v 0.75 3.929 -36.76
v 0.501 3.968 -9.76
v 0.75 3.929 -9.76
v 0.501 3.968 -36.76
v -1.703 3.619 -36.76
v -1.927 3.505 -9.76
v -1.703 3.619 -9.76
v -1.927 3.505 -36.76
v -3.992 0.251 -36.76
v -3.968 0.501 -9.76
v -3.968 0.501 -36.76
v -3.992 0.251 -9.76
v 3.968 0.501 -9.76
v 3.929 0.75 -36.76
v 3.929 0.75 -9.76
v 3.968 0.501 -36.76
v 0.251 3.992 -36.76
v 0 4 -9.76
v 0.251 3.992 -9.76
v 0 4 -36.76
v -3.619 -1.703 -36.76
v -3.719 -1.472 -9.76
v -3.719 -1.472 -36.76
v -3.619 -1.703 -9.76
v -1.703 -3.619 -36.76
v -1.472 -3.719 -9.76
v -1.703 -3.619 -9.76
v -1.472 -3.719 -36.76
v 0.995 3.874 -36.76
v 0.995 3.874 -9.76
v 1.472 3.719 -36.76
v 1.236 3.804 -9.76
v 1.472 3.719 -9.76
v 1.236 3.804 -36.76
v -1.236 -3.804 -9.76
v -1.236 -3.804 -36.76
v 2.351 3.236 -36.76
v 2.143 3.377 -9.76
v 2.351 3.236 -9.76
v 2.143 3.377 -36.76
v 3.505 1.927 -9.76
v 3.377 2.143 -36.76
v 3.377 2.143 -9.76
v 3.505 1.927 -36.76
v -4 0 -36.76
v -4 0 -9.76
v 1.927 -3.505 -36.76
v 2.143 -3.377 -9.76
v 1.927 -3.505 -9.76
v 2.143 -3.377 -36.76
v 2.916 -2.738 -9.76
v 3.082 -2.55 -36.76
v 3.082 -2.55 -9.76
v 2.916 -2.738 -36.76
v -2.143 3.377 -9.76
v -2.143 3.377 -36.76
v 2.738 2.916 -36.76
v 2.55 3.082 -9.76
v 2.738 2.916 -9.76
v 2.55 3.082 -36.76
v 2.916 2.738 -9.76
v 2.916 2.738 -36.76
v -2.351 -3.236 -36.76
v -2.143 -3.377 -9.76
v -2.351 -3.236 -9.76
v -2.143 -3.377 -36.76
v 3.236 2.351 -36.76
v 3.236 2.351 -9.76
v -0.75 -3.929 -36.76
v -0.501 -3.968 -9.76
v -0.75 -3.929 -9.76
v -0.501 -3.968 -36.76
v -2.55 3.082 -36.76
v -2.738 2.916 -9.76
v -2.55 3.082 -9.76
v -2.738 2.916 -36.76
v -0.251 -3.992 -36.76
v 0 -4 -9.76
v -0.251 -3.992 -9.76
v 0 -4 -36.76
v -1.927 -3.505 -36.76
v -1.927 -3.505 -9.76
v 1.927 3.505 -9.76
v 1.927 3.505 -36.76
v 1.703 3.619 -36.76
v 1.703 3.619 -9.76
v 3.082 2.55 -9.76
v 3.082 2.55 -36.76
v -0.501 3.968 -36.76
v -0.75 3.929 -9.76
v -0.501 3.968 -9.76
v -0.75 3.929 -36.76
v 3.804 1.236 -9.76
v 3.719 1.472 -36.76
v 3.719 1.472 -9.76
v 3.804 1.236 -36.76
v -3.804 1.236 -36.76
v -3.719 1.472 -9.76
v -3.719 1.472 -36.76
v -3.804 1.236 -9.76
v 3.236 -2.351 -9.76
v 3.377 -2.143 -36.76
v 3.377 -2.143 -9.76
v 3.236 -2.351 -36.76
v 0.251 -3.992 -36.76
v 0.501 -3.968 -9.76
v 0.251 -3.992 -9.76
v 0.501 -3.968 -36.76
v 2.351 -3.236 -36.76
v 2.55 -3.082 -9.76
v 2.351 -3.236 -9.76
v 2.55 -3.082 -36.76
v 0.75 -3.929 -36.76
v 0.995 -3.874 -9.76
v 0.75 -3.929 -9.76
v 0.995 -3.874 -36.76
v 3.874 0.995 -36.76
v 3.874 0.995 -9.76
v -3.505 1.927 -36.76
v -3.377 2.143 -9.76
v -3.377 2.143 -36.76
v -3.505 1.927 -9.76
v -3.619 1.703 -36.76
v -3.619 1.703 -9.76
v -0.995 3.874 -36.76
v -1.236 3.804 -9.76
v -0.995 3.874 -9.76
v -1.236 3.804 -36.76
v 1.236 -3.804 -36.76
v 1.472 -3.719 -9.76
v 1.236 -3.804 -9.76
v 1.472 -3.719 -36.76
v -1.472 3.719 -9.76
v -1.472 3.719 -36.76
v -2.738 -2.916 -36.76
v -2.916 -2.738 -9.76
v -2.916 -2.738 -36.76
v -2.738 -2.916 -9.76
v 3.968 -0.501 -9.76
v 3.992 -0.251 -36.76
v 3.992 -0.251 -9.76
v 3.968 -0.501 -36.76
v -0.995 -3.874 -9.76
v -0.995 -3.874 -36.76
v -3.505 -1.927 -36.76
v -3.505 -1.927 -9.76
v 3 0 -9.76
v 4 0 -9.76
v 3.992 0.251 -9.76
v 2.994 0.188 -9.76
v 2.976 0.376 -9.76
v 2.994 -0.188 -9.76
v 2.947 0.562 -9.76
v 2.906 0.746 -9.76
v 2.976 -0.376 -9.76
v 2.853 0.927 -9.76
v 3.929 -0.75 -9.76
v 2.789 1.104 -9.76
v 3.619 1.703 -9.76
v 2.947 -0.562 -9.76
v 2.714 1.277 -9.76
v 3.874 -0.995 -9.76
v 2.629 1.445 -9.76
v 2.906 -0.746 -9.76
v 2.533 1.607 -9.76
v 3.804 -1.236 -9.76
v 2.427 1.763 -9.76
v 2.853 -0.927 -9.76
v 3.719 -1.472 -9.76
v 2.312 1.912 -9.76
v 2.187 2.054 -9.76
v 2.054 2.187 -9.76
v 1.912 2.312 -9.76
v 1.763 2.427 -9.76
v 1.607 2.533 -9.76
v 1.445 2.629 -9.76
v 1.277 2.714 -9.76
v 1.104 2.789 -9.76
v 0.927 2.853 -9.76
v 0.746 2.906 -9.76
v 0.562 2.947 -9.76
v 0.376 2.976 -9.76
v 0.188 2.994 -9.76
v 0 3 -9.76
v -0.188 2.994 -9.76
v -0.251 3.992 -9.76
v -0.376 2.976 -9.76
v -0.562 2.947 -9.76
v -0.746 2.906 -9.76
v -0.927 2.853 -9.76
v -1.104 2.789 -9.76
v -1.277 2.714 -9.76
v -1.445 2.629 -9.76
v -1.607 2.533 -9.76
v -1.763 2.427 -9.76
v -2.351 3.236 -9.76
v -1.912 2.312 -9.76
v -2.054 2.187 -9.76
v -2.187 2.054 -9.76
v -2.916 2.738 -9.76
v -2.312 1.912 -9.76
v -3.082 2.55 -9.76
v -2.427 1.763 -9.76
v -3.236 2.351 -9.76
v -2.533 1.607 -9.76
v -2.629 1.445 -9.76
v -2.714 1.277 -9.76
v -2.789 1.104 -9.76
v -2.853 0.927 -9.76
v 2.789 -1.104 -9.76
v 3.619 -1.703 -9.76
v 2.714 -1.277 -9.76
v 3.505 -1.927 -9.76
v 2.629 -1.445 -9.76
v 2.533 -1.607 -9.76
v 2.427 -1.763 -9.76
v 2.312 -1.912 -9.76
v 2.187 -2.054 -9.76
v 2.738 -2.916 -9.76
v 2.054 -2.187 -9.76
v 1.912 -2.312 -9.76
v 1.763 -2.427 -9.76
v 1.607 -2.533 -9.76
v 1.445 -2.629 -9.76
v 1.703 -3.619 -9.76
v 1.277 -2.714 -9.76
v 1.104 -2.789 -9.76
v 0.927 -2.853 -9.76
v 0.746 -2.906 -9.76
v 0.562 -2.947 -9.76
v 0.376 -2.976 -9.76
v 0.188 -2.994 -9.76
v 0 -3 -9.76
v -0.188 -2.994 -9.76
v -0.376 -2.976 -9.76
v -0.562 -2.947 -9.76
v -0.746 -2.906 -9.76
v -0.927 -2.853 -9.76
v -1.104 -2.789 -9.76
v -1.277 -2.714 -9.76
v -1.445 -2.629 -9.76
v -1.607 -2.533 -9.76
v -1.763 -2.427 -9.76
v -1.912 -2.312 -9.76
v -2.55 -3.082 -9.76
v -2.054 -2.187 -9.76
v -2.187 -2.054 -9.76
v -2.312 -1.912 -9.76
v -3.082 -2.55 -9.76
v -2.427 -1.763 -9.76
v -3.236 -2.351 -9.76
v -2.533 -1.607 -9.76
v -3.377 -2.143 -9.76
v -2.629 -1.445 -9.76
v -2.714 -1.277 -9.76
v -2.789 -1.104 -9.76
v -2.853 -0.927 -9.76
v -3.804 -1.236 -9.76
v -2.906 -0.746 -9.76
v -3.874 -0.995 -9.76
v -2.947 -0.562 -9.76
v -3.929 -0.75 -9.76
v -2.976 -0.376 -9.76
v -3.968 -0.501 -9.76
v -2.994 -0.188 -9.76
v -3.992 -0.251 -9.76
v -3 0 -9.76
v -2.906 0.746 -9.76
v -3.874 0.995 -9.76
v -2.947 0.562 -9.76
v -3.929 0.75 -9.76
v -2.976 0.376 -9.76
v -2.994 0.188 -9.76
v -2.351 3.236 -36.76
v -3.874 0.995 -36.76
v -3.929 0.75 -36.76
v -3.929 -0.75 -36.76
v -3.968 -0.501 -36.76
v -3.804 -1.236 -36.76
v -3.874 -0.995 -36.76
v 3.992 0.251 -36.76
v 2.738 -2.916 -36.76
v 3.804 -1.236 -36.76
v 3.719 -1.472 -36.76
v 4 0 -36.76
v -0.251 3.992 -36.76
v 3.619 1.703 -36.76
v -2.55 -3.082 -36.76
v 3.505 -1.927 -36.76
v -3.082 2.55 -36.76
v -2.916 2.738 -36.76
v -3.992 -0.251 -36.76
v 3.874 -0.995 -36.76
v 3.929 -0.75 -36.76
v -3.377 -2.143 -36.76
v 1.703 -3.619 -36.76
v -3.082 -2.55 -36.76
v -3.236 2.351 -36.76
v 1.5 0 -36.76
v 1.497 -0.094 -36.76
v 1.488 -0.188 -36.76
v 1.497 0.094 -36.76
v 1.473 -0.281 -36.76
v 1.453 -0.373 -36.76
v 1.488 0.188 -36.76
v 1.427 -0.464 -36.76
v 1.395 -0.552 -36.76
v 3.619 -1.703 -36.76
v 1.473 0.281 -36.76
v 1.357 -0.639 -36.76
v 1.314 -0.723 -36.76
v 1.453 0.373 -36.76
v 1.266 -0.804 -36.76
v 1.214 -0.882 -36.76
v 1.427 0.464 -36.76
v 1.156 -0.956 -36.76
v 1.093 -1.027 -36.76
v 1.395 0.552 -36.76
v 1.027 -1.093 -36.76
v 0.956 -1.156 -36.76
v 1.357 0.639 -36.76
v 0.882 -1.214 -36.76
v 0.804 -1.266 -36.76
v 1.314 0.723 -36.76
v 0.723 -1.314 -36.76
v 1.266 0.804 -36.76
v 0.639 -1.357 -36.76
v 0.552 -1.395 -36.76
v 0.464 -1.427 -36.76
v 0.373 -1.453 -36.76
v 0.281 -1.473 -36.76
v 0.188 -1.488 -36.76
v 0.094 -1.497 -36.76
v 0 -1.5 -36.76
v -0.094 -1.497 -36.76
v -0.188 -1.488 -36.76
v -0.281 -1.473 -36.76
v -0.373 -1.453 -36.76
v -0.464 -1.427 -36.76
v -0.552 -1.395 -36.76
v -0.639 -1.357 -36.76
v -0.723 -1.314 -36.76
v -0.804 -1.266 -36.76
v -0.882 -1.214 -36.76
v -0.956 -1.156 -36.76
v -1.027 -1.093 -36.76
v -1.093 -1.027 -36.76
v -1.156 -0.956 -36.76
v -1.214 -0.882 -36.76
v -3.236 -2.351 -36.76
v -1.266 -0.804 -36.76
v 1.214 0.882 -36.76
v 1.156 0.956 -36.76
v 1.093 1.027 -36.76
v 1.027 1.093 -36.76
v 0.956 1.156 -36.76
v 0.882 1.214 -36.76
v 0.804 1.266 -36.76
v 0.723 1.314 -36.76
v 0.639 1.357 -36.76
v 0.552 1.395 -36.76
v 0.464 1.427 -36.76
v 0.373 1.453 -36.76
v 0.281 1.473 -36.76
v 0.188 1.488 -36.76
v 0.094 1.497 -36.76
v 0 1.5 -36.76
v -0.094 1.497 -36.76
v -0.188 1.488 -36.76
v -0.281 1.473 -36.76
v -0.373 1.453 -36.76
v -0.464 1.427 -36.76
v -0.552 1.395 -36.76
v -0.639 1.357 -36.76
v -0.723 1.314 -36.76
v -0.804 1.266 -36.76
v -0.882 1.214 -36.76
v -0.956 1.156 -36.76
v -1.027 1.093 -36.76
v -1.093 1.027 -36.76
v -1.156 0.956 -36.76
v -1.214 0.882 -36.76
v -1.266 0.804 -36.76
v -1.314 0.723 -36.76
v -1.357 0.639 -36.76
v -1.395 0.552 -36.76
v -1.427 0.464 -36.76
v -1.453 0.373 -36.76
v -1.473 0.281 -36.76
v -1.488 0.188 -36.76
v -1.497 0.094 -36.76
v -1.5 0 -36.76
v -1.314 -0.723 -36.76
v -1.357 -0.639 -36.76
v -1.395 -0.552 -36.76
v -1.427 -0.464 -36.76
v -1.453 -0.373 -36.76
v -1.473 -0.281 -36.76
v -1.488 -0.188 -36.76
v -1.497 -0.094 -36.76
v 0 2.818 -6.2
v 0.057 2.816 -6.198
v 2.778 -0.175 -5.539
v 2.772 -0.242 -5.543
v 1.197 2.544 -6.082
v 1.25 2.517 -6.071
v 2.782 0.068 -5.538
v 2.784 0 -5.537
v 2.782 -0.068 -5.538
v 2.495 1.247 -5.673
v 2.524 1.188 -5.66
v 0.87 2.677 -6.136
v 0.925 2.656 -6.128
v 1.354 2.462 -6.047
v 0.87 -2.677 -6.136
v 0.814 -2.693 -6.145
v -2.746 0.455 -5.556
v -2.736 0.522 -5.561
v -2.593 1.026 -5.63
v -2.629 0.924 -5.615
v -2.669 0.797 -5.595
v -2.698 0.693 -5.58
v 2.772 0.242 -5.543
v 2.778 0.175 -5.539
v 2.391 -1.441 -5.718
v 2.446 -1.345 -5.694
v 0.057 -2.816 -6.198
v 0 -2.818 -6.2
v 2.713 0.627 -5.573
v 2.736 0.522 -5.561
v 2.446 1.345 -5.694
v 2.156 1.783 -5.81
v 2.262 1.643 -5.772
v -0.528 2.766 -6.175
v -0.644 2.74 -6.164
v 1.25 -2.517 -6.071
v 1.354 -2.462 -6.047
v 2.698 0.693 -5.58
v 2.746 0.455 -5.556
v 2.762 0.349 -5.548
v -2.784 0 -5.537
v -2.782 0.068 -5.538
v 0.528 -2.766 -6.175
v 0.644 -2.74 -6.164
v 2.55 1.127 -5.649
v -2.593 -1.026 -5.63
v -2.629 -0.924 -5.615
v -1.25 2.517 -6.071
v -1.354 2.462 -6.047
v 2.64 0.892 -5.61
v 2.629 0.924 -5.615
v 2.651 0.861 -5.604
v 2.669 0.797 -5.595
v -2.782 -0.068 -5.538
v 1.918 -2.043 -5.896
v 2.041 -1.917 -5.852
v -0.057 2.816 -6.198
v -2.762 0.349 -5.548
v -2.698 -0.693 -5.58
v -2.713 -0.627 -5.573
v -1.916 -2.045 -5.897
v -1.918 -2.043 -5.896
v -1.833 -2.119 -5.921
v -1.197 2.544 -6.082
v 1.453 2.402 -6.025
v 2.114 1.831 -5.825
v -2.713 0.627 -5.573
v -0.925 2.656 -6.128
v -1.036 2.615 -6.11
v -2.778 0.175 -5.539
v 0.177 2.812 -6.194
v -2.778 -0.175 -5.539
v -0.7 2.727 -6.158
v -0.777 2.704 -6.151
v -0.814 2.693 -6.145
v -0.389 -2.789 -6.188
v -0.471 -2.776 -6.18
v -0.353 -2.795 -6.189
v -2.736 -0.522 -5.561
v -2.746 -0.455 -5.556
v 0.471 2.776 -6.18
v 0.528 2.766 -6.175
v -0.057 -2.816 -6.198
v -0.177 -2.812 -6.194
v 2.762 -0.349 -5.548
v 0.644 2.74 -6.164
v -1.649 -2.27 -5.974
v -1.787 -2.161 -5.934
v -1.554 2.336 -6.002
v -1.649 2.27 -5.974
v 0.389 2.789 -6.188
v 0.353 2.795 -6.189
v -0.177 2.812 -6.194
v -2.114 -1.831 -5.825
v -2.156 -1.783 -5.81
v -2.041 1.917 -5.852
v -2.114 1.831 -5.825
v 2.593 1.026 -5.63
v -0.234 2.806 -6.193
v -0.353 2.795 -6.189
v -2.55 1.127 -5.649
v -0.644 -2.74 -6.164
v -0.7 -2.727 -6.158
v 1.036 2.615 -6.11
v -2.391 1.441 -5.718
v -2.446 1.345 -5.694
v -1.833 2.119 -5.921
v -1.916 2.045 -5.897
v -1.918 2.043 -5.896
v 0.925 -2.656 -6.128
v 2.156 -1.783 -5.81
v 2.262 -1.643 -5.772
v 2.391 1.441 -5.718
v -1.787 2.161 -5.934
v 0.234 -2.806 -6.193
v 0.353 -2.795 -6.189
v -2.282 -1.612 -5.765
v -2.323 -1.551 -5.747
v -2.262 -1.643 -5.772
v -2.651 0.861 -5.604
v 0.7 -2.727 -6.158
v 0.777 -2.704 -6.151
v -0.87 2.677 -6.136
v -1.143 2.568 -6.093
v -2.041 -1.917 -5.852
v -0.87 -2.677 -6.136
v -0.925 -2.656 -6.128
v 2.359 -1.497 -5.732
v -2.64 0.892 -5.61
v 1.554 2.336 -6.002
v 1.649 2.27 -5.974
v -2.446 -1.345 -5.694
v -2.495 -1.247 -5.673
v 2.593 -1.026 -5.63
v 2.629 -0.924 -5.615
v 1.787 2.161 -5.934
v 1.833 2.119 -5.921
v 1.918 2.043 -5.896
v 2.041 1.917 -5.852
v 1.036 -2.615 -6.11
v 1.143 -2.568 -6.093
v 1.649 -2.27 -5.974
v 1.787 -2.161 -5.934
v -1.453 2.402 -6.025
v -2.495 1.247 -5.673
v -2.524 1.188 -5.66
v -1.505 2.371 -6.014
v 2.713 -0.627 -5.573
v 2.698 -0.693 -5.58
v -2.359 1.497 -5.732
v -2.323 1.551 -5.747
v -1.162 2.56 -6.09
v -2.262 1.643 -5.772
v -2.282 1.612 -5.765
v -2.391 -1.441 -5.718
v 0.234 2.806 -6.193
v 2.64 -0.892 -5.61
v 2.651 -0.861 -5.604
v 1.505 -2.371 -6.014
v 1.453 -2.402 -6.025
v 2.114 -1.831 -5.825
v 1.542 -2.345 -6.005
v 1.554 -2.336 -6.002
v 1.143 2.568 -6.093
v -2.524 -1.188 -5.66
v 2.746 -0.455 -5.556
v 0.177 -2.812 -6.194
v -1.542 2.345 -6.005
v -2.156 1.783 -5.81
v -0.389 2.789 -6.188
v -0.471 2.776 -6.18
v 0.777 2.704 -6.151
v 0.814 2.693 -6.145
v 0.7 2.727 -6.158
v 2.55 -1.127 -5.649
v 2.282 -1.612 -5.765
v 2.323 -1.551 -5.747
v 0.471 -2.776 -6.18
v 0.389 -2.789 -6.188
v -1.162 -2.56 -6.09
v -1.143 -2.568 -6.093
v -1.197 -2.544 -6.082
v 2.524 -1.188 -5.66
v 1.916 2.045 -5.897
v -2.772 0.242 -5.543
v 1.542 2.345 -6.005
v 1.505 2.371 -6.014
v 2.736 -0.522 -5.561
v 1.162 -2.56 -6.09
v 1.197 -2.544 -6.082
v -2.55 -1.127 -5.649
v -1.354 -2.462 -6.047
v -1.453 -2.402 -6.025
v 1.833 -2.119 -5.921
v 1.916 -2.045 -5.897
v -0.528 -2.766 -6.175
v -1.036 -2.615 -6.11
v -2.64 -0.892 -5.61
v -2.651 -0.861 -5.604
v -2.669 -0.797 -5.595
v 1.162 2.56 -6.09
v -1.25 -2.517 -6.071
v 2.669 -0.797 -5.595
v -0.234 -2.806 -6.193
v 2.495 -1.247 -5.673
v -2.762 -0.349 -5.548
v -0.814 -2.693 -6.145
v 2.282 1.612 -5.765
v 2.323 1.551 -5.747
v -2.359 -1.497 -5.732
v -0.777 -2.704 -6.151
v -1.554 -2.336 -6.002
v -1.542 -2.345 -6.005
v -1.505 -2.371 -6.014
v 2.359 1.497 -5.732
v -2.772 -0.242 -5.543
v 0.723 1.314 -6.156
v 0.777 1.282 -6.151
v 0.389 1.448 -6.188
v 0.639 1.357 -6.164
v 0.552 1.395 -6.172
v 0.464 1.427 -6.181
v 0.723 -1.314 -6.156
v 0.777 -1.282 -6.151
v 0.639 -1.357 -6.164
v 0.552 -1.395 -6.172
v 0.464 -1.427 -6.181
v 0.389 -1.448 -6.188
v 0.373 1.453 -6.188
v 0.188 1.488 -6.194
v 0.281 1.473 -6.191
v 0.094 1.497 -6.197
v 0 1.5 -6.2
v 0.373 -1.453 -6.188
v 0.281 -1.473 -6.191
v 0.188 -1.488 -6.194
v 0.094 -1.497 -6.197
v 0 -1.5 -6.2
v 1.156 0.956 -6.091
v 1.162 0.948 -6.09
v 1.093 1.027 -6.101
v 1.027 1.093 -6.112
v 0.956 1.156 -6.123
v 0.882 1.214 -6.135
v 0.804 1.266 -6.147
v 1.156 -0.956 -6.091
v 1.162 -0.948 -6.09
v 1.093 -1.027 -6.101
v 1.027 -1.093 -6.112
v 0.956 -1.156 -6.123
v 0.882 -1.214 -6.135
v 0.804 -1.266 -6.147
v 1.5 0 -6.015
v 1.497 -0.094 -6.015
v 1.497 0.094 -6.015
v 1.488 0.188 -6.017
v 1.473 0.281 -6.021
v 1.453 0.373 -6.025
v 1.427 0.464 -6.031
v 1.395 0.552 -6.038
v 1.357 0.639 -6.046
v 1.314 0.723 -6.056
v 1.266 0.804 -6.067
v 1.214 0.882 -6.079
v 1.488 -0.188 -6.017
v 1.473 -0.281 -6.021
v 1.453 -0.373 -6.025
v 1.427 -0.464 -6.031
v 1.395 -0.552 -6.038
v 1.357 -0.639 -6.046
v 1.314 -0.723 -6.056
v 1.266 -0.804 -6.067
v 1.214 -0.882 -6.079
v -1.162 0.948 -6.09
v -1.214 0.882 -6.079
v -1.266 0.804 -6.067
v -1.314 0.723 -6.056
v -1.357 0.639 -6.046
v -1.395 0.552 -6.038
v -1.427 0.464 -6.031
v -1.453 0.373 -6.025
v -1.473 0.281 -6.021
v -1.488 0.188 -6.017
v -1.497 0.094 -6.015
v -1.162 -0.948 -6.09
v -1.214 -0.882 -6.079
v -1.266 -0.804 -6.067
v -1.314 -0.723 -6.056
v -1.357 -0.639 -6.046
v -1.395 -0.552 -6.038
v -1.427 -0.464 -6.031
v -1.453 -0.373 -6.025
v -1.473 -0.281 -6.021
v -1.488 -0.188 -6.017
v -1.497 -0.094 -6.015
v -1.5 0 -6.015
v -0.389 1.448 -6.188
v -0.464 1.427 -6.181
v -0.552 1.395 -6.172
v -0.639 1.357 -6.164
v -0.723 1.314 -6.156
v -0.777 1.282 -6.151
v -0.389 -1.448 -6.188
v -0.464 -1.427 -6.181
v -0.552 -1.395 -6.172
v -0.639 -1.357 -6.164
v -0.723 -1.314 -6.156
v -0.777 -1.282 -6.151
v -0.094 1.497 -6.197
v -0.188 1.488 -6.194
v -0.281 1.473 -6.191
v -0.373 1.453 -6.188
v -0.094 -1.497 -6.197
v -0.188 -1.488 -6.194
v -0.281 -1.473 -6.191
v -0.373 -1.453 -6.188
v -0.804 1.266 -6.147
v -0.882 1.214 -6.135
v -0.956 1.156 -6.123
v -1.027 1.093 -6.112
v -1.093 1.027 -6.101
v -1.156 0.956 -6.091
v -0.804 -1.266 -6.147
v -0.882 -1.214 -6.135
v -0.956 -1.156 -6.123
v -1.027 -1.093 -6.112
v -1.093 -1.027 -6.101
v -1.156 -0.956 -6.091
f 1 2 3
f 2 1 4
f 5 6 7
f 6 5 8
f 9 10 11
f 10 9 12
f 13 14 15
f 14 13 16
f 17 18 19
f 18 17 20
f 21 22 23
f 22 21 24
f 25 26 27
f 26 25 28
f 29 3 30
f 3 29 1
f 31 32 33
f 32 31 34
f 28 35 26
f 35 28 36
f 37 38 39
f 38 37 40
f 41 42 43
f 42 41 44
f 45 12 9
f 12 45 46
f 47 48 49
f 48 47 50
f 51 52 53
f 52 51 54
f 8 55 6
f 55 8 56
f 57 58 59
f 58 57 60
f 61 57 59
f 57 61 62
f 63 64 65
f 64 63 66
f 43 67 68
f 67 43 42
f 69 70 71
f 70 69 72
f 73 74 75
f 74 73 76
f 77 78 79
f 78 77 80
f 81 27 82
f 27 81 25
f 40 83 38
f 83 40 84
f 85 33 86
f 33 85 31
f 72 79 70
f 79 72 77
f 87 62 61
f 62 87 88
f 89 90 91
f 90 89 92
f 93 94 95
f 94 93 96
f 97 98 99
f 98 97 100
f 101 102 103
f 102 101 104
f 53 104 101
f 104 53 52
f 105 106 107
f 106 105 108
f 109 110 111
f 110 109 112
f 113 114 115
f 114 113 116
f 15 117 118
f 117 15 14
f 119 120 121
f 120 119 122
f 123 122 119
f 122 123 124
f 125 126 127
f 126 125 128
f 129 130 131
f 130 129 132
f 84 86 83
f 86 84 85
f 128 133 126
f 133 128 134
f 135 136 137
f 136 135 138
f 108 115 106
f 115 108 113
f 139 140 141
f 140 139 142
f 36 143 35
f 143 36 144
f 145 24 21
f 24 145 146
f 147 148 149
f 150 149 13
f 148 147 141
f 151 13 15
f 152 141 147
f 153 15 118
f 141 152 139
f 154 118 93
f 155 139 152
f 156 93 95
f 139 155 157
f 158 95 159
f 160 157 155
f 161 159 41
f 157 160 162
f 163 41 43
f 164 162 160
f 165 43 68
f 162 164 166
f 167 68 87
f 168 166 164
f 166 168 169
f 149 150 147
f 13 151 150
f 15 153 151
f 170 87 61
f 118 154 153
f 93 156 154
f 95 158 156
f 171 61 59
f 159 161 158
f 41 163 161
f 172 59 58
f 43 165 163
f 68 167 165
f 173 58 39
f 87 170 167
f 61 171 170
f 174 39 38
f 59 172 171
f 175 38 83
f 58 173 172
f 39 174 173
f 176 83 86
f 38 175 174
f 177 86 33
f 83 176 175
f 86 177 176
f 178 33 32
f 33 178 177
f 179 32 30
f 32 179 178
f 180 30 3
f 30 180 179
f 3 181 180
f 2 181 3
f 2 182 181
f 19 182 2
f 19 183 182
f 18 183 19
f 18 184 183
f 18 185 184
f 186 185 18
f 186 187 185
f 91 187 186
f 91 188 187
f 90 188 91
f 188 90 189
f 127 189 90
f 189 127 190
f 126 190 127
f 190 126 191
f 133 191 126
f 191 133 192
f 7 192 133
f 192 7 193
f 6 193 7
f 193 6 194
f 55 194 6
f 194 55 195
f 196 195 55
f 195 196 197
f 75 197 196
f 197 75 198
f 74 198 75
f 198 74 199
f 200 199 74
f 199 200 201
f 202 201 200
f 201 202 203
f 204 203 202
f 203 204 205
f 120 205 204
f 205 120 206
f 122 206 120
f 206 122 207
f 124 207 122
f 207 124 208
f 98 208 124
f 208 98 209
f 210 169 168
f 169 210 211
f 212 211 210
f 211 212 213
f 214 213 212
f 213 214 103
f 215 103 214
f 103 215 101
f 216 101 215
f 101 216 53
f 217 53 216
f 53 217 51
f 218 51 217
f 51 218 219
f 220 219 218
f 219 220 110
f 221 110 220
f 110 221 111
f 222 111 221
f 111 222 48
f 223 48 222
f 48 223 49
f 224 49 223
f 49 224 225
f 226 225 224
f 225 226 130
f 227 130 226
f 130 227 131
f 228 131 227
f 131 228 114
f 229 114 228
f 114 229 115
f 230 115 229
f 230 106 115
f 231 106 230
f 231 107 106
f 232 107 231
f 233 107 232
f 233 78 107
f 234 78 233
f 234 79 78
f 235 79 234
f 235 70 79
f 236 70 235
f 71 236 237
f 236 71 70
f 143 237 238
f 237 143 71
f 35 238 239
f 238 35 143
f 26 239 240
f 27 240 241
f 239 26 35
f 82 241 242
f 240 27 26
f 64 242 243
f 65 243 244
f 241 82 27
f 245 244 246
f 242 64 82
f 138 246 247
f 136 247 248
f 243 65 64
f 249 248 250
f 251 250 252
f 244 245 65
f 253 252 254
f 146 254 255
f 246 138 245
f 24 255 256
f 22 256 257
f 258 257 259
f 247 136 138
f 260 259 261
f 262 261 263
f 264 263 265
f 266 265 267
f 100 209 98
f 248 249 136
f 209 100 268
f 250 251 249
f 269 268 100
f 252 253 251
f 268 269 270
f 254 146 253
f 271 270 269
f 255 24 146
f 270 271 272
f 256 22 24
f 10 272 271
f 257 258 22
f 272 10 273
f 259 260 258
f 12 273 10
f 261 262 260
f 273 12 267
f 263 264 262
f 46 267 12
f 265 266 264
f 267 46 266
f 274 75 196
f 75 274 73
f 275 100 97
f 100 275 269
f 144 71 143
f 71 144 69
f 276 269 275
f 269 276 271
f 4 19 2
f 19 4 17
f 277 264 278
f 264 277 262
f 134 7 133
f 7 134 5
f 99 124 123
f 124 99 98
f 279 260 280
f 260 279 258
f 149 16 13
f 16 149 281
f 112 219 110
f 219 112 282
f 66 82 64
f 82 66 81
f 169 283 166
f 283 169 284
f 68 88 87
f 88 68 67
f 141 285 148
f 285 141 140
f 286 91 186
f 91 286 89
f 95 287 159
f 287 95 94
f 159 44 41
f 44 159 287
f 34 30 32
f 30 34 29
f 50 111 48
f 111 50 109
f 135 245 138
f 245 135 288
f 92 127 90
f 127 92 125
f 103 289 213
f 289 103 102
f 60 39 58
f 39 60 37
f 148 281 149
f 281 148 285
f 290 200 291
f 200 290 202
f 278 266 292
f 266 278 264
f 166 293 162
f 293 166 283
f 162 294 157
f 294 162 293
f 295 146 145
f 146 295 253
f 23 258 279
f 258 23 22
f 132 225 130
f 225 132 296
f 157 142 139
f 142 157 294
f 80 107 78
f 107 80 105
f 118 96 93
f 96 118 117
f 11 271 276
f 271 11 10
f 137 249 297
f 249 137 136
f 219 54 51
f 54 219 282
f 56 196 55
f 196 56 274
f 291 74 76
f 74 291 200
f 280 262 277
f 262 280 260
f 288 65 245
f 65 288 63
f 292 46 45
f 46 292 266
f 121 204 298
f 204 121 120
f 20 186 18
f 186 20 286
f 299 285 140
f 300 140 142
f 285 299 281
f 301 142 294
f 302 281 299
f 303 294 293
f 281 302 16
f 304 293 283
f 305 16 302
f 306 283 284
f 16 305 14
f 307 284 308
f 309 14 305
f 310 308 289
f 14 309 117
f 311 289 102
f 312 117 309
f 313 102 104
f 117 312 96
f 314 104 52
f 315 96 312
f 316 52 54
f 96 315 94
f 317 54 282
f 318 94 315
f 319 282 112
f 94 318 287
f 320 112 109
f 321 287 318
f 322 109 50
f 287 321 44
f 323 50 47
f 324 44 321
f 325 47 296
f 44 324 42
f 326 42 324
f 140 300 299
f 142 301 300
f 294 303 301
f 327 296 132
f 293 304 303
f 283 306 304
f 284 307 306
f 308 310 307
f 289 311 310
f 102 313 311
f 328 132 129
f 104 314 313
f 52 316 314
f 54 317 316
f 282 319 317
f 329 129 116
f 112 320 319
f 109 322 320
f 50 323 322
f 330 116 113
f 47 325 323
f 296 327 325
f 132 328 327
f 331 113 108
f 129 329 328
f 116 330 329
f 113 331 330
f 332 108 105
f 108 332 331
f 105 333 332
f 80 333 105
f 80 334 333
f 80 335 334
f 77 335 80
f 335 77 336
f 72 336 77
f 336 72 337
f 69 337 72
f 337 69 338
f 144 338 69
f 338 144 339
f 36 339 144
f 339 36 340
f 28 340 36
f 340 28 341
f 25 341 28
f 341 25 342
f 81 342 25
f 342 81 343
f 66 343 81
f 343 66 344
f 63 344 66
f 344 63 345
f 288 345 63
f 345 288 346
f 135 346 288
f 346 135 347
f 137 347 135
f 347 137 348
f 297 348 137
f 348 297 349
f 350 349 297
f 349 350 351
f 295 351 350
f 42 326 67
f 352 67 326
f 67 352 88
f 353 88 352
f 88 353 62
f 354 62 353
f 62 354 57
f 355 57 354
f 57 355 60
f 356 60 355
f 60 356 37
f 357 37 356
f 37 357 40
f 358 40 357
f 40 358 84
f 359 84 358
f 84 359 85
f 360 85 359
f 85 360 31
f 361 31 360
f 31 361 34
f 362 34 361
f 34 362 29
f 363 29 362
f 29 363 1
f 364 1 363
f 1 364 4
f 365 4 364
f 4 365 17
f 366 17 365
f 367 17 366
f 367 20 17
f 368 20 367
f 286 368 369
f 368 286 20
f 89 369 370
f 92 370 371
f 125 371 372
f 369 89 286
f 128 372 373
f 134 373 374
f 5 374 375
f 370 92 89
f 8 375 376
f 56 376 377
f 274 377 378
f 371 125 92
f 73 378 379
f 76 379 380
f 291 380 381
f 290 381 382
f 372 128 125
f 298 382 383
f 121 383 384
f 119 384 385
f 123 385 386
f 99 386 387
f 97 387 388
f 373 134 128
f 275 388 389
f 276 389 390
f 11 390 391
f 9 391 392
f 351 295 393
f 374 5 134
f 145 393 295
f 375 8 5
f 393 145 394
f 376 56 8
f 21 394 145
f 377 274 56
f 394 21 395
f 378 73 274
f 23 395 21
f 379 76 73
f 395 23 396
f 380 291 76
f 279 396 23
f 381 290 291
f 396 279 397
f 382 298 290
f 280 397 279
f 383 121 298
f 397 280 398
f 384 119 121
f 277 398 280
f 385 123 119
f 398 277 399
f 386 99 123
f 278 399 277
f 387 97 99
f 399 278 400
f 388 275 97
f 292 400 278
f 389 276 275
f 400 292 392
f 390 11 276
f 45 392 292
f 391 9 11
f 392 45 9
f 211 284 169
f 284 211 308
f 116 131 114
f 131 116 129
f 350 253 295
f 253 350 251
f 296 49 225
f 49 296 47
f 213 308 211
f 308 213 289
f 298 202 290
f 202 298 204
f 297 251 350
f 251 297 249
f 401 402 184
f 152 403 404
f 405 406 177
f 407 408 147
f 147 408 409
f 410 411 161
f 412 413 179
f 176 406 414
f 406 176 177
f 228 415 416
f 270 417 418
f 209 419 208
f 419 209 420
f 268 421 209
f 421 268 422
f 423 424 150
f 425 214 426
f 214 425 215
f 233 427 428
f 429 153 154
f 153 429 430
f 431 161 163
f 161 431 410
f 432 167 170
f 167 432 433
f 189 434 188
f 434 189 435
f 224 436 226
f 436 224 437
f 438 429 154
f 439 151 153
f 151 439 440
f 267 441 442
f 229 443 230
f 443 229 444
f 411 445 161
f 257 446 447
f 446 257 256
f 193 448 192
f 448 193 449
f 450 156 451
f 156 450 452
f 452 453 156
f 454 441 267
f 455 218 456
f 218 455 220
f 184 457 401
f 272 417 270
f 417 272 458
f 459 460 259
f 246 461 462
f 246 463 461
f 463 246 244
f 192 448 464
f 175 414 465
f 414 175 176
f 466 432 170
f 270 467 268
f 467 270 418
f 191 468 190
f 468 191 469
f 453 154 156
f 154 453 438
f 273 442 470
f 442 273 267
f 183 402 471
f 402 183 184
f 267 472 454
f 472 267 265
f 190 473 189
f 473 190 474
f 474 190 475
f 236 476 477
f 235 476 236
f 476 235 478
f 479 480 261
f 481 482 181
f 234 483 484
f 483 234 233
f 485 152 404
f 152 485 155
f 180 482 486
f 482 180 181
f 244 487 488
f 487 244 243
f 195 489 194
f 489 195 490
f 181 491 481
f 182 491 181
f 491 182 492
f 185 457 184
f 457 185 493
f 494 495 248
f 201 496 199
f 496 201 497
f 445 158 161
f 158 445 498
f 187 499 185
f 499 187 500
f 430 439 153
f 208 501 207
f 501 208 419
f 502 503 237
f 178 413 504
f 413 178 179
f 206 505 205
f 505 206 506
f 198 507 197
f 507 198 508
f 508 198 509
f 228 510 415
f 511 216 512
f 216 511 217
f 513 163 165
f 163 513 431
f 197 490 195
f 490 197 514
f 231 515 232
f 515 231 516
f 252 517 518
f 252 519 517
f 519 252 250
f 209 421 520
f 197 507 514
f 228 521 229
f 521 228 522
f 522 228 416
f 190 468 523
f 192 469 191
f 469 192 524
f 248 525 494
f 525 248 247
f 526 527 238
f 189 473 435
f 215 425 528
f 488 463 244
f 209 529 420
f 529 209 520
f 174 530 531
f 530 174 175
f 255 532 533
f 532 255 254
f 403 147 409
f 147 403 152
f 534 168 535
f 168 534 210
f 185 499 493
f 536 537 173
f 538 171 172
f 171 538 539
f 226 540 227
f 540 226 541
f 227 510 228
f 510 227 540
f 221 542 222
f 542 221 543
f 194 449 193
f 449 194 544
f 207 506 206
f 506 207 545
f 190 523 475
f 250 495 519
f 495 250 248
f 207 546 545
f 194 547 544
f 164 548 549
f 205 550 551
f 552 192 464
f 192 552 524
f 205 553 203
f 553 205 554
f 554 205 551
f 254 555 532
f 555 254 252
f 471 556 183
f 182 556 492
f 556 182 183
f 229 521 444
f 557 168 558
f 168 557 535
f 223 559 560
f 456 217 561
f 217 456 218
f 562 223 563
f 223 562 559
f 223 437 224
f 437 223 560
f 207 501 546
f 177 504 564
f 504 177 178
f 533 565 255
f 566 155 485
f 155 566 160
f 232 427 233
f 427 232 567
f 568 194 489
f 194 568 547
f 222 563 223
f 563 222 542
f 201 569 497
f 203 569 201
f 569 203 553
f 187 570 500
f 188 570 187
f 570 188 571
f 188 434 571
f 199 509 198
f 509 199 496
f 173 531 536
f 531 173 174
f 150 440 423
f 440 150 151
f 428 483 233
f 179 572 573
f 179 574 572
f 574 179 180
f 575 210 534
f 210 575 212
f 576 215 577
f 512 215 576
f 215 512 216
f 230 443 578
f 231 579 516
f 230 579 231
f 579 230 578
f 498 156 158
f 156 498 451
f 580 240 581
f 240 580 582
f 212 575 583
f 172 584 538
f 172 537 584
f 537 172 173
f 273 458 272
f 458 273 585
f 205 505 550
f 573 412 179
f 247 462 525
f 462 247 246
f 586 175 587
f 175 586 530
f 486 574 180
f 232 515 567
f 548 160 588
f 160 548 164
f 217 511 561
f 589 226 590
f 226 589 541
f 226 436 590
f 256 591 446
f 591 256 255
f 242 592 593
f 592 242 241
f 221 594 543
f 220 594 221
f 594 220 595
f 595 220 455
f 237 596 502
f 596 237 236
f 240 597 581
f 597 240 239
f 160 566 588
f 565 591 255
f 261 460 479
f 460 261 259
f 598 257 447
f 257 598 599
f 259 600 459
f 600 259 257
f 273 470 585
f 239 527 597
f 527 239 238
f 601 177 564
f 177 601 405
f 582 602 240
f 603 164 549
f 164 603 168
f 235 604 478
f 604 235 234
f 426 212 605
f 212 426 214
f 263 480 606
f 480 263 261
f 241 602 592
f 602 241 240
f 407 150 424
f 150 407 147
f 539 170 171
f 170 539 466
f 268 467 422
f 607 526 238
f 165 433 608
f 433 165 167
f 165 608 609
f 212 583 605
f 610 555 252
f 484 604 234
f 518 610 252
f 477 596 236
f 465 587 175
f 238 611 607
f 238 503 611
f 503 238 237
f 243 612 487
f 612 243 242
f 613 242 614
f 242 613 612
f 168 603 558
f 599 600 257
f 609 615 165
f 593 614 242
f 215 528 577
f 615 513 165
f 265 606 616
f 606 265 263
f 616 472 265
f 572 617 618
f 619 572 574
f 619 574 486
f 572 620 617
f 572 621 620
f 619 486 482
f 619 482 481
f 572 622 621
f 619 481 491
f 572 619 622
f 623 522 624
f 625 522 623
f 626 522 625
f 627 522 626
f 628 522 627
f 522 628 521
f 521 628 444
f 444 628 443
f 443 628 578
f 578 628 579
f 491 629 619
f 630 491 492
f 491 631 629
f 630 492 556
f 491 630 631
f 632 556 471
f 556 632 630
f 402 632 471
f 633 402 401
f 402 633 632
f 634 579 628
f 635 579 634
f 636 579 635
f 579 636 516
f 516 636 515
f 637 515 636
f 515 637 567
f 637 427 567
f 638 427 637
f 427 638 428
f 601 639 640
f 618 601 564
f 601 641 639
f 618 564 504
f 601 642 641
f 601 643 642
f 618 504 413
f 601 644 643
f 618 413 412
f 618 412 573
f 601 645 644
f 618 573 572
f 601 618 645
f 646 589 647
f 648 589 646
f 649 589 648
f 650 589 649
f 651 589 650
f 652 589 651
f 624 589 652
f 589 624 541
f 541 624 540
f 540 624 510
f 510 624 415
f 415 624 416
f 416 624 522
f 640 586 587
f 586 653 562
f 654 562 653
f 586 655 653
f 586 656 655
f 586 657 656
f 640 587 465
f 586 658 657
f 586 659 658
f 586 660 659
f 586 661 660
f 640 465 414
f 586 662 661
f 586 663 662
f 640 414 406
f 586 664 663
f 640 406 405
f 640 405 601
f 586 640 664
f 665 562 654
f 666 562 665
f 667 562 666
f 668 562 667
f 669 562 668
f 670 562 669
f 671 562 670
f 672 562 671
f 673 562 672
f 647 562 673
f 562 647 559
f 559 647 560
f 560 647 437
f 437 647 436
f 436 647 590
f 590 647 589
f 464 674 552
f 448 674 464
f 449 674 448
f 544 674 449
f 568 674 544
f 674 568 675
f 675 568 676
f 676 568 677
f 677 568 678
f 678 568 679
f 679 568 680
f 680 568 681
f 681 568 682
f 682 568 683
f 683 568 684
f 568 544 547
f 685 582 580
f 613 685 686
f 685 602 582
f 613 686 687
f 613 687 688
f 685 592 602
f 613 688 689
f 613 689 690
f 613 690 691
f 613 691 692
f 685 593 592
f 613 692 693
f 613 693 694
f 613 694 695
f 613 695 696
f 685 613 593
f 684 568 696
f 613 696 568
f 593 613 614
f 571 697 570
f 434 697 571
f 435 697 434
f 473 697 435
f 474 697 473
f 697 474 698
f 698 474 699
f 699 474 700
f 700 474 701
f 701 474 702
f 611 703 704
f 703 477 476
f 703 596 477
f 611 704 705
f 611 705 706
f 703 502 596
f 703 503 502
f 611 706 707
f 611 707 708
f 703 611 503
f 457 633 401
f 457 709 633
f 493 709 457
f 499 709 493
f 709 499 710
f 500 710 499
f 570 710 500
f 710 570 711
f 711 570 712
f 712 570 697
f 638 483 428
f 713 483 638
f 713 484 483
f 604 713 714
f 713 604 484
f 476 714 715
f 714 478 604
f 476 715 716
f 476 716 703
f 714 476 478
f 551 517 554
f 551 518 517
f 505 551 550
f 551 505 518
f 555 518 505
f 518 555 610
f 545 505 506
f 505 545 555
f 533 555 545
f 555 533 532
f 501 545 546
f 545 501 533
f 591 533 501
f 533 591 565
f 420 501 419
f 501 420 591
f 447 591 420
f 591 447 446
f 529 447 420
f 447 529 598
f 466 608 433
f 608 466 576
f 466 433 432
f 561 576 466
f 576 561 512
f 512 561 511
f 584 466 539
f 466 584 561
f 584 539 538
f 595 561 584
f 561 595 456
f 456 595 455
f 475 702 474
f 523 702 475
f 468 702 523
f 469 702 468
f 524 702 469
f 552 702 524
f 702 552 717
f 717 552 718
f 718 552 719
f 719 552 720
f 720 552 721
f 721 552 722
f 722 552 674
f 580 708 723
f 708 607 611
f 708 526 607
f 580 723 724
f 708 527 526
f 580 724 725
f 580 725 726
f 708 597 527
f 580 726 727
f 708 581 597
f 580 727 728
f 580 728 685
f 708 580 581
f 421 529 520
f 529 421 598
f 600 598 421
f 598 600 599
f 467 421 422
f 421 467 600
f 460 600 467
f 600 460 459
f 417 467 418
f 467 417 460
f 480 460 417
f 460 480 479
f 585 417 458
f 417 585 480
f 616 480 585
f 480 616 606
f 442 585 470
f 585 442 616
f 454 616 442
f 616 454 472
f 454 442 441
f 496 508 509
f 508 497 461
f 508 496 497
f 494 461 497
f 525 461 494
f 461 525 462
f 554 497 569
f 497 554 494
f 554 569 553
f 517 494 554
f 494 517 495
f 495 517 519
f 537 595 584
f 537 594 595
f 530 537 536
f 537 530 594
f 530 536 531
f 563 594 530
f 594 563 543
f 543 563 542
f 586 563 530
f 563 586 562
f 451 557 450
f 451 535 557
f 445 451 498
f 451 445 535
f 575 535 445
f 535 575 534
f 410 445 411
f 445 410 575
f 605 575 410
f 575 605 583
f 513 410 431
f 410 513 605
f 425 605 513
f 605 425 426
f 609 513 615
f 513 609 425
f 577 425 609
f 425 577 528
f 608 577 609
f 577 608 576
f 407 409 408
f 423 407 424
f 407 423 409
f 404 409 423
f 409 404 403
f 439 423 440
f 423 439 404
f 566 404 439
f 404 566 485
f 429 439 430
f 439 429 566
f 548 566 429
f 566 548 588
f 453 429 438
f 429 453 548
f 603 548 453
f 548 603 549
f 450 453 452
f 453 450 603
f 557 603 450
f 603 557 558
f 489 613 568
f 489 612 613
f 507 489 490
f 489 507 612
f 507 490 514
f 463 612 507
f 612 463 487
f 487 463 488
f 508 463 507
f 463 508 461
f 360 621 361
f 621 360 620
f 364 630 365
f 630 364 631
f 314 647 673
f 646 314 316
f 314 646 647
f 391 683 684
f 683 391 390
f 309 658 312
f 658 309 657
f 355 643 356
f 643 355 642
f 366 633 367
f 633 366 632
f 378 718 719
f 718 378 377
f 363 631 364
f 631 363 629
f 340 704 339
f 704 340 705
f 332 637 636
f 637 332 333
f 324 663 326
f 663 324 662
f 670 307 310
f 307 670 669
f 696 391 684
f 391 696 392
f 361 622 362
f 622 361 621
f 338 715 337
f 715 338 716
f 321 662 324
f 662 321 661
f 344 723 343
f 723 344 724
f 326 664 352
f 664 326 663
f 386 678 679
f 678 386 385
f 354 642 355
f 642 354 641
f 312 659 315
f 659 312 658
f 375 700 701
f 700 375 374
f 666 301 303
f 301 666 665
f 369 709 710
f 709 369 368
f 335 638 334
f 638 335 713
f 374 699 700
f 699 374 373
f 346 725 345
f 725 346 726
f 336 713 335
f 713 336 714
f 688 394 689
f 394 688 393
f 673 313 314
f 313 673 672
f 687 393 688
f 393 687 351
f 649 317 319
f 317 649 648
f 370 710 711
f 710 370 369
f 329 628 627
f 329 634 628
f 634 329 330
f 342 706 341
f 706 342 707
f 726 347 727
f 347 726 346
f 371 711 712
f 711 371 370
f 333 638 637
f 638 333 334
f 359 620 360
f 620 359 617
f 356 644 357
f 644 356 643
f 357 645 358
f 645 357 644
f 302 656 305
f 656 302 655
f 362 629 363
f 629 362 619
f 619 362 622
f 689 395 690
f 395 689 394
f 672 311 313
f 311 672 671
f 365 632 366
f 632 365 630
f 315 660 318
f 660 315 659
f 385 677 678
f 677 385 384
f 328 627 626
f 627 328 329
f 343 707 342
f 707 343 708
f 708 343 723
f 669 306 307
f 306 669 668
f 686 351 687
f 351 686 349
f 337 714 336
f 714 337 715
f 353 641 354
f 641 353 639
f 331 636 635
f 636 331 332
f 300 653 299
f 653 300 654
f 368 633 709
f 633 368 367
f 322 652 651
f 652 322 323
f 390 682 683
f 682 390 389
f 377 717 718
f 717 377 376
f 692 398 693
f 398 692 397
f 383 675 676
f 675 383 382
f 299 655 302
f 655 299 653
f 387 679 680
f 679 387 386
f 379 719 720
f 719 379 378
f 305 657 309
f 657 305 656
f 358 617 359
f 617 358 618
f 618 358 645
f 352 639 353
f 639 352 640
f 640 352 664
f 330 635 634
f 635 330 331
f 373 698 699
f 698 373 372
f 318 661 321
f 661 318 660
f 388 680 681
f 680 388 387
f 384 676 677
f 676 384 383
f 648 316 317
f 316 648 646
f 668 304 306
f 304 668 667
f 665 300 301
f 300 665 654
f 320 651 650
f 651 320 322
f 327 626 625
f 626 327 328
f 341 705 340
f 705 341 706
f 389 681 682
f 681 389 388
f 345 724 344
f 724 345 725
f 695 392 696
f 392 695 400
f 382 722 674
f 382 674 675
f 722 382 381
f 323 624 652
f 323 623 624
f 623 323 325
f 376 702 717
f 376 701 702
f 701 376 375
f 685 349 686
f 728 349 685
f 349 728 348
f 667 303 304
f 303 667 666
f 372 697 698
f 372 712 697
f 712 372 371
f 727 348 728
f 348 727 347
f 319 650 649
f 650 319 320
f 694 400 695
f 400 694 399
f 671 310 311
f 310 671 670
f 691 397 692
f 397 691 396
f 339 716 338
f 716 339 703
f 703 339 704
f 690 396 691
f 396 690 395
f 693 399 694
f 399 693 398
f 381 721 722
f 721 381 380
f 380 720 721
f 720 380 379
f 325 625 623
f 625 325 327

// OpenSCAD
include <../lib/Getriebe.scad>;

$fn=100;

module arm_shaft() {
    margin = 0.4;
    inner_thread_diameter = 12+margin;
    gear_act = 2.23995;
    gear_edge = 12-gear_act;
    difference() {
        union() {
            translate([27/2+gear_edge, 0, 0])
            rotate([0, 90, 0])
            cylinder(r=8/2,h=27,center=true);
            translate([gear_edge/2, 0, 0])
            rotate([0, 90, 0])
            cylinder(r2=6/2,r1=5/2,h=gear_edge,center=true);
        }
        cylinder(r=inner_thread_diameter/2,h=100,center=true);
        
            translate([100/2, 0, 0])
            rotate([0, 90, 0])
            cylinder(r=3/2,h=100,center=true);
    }
}
rotate([90,90])
arm_shaft();
